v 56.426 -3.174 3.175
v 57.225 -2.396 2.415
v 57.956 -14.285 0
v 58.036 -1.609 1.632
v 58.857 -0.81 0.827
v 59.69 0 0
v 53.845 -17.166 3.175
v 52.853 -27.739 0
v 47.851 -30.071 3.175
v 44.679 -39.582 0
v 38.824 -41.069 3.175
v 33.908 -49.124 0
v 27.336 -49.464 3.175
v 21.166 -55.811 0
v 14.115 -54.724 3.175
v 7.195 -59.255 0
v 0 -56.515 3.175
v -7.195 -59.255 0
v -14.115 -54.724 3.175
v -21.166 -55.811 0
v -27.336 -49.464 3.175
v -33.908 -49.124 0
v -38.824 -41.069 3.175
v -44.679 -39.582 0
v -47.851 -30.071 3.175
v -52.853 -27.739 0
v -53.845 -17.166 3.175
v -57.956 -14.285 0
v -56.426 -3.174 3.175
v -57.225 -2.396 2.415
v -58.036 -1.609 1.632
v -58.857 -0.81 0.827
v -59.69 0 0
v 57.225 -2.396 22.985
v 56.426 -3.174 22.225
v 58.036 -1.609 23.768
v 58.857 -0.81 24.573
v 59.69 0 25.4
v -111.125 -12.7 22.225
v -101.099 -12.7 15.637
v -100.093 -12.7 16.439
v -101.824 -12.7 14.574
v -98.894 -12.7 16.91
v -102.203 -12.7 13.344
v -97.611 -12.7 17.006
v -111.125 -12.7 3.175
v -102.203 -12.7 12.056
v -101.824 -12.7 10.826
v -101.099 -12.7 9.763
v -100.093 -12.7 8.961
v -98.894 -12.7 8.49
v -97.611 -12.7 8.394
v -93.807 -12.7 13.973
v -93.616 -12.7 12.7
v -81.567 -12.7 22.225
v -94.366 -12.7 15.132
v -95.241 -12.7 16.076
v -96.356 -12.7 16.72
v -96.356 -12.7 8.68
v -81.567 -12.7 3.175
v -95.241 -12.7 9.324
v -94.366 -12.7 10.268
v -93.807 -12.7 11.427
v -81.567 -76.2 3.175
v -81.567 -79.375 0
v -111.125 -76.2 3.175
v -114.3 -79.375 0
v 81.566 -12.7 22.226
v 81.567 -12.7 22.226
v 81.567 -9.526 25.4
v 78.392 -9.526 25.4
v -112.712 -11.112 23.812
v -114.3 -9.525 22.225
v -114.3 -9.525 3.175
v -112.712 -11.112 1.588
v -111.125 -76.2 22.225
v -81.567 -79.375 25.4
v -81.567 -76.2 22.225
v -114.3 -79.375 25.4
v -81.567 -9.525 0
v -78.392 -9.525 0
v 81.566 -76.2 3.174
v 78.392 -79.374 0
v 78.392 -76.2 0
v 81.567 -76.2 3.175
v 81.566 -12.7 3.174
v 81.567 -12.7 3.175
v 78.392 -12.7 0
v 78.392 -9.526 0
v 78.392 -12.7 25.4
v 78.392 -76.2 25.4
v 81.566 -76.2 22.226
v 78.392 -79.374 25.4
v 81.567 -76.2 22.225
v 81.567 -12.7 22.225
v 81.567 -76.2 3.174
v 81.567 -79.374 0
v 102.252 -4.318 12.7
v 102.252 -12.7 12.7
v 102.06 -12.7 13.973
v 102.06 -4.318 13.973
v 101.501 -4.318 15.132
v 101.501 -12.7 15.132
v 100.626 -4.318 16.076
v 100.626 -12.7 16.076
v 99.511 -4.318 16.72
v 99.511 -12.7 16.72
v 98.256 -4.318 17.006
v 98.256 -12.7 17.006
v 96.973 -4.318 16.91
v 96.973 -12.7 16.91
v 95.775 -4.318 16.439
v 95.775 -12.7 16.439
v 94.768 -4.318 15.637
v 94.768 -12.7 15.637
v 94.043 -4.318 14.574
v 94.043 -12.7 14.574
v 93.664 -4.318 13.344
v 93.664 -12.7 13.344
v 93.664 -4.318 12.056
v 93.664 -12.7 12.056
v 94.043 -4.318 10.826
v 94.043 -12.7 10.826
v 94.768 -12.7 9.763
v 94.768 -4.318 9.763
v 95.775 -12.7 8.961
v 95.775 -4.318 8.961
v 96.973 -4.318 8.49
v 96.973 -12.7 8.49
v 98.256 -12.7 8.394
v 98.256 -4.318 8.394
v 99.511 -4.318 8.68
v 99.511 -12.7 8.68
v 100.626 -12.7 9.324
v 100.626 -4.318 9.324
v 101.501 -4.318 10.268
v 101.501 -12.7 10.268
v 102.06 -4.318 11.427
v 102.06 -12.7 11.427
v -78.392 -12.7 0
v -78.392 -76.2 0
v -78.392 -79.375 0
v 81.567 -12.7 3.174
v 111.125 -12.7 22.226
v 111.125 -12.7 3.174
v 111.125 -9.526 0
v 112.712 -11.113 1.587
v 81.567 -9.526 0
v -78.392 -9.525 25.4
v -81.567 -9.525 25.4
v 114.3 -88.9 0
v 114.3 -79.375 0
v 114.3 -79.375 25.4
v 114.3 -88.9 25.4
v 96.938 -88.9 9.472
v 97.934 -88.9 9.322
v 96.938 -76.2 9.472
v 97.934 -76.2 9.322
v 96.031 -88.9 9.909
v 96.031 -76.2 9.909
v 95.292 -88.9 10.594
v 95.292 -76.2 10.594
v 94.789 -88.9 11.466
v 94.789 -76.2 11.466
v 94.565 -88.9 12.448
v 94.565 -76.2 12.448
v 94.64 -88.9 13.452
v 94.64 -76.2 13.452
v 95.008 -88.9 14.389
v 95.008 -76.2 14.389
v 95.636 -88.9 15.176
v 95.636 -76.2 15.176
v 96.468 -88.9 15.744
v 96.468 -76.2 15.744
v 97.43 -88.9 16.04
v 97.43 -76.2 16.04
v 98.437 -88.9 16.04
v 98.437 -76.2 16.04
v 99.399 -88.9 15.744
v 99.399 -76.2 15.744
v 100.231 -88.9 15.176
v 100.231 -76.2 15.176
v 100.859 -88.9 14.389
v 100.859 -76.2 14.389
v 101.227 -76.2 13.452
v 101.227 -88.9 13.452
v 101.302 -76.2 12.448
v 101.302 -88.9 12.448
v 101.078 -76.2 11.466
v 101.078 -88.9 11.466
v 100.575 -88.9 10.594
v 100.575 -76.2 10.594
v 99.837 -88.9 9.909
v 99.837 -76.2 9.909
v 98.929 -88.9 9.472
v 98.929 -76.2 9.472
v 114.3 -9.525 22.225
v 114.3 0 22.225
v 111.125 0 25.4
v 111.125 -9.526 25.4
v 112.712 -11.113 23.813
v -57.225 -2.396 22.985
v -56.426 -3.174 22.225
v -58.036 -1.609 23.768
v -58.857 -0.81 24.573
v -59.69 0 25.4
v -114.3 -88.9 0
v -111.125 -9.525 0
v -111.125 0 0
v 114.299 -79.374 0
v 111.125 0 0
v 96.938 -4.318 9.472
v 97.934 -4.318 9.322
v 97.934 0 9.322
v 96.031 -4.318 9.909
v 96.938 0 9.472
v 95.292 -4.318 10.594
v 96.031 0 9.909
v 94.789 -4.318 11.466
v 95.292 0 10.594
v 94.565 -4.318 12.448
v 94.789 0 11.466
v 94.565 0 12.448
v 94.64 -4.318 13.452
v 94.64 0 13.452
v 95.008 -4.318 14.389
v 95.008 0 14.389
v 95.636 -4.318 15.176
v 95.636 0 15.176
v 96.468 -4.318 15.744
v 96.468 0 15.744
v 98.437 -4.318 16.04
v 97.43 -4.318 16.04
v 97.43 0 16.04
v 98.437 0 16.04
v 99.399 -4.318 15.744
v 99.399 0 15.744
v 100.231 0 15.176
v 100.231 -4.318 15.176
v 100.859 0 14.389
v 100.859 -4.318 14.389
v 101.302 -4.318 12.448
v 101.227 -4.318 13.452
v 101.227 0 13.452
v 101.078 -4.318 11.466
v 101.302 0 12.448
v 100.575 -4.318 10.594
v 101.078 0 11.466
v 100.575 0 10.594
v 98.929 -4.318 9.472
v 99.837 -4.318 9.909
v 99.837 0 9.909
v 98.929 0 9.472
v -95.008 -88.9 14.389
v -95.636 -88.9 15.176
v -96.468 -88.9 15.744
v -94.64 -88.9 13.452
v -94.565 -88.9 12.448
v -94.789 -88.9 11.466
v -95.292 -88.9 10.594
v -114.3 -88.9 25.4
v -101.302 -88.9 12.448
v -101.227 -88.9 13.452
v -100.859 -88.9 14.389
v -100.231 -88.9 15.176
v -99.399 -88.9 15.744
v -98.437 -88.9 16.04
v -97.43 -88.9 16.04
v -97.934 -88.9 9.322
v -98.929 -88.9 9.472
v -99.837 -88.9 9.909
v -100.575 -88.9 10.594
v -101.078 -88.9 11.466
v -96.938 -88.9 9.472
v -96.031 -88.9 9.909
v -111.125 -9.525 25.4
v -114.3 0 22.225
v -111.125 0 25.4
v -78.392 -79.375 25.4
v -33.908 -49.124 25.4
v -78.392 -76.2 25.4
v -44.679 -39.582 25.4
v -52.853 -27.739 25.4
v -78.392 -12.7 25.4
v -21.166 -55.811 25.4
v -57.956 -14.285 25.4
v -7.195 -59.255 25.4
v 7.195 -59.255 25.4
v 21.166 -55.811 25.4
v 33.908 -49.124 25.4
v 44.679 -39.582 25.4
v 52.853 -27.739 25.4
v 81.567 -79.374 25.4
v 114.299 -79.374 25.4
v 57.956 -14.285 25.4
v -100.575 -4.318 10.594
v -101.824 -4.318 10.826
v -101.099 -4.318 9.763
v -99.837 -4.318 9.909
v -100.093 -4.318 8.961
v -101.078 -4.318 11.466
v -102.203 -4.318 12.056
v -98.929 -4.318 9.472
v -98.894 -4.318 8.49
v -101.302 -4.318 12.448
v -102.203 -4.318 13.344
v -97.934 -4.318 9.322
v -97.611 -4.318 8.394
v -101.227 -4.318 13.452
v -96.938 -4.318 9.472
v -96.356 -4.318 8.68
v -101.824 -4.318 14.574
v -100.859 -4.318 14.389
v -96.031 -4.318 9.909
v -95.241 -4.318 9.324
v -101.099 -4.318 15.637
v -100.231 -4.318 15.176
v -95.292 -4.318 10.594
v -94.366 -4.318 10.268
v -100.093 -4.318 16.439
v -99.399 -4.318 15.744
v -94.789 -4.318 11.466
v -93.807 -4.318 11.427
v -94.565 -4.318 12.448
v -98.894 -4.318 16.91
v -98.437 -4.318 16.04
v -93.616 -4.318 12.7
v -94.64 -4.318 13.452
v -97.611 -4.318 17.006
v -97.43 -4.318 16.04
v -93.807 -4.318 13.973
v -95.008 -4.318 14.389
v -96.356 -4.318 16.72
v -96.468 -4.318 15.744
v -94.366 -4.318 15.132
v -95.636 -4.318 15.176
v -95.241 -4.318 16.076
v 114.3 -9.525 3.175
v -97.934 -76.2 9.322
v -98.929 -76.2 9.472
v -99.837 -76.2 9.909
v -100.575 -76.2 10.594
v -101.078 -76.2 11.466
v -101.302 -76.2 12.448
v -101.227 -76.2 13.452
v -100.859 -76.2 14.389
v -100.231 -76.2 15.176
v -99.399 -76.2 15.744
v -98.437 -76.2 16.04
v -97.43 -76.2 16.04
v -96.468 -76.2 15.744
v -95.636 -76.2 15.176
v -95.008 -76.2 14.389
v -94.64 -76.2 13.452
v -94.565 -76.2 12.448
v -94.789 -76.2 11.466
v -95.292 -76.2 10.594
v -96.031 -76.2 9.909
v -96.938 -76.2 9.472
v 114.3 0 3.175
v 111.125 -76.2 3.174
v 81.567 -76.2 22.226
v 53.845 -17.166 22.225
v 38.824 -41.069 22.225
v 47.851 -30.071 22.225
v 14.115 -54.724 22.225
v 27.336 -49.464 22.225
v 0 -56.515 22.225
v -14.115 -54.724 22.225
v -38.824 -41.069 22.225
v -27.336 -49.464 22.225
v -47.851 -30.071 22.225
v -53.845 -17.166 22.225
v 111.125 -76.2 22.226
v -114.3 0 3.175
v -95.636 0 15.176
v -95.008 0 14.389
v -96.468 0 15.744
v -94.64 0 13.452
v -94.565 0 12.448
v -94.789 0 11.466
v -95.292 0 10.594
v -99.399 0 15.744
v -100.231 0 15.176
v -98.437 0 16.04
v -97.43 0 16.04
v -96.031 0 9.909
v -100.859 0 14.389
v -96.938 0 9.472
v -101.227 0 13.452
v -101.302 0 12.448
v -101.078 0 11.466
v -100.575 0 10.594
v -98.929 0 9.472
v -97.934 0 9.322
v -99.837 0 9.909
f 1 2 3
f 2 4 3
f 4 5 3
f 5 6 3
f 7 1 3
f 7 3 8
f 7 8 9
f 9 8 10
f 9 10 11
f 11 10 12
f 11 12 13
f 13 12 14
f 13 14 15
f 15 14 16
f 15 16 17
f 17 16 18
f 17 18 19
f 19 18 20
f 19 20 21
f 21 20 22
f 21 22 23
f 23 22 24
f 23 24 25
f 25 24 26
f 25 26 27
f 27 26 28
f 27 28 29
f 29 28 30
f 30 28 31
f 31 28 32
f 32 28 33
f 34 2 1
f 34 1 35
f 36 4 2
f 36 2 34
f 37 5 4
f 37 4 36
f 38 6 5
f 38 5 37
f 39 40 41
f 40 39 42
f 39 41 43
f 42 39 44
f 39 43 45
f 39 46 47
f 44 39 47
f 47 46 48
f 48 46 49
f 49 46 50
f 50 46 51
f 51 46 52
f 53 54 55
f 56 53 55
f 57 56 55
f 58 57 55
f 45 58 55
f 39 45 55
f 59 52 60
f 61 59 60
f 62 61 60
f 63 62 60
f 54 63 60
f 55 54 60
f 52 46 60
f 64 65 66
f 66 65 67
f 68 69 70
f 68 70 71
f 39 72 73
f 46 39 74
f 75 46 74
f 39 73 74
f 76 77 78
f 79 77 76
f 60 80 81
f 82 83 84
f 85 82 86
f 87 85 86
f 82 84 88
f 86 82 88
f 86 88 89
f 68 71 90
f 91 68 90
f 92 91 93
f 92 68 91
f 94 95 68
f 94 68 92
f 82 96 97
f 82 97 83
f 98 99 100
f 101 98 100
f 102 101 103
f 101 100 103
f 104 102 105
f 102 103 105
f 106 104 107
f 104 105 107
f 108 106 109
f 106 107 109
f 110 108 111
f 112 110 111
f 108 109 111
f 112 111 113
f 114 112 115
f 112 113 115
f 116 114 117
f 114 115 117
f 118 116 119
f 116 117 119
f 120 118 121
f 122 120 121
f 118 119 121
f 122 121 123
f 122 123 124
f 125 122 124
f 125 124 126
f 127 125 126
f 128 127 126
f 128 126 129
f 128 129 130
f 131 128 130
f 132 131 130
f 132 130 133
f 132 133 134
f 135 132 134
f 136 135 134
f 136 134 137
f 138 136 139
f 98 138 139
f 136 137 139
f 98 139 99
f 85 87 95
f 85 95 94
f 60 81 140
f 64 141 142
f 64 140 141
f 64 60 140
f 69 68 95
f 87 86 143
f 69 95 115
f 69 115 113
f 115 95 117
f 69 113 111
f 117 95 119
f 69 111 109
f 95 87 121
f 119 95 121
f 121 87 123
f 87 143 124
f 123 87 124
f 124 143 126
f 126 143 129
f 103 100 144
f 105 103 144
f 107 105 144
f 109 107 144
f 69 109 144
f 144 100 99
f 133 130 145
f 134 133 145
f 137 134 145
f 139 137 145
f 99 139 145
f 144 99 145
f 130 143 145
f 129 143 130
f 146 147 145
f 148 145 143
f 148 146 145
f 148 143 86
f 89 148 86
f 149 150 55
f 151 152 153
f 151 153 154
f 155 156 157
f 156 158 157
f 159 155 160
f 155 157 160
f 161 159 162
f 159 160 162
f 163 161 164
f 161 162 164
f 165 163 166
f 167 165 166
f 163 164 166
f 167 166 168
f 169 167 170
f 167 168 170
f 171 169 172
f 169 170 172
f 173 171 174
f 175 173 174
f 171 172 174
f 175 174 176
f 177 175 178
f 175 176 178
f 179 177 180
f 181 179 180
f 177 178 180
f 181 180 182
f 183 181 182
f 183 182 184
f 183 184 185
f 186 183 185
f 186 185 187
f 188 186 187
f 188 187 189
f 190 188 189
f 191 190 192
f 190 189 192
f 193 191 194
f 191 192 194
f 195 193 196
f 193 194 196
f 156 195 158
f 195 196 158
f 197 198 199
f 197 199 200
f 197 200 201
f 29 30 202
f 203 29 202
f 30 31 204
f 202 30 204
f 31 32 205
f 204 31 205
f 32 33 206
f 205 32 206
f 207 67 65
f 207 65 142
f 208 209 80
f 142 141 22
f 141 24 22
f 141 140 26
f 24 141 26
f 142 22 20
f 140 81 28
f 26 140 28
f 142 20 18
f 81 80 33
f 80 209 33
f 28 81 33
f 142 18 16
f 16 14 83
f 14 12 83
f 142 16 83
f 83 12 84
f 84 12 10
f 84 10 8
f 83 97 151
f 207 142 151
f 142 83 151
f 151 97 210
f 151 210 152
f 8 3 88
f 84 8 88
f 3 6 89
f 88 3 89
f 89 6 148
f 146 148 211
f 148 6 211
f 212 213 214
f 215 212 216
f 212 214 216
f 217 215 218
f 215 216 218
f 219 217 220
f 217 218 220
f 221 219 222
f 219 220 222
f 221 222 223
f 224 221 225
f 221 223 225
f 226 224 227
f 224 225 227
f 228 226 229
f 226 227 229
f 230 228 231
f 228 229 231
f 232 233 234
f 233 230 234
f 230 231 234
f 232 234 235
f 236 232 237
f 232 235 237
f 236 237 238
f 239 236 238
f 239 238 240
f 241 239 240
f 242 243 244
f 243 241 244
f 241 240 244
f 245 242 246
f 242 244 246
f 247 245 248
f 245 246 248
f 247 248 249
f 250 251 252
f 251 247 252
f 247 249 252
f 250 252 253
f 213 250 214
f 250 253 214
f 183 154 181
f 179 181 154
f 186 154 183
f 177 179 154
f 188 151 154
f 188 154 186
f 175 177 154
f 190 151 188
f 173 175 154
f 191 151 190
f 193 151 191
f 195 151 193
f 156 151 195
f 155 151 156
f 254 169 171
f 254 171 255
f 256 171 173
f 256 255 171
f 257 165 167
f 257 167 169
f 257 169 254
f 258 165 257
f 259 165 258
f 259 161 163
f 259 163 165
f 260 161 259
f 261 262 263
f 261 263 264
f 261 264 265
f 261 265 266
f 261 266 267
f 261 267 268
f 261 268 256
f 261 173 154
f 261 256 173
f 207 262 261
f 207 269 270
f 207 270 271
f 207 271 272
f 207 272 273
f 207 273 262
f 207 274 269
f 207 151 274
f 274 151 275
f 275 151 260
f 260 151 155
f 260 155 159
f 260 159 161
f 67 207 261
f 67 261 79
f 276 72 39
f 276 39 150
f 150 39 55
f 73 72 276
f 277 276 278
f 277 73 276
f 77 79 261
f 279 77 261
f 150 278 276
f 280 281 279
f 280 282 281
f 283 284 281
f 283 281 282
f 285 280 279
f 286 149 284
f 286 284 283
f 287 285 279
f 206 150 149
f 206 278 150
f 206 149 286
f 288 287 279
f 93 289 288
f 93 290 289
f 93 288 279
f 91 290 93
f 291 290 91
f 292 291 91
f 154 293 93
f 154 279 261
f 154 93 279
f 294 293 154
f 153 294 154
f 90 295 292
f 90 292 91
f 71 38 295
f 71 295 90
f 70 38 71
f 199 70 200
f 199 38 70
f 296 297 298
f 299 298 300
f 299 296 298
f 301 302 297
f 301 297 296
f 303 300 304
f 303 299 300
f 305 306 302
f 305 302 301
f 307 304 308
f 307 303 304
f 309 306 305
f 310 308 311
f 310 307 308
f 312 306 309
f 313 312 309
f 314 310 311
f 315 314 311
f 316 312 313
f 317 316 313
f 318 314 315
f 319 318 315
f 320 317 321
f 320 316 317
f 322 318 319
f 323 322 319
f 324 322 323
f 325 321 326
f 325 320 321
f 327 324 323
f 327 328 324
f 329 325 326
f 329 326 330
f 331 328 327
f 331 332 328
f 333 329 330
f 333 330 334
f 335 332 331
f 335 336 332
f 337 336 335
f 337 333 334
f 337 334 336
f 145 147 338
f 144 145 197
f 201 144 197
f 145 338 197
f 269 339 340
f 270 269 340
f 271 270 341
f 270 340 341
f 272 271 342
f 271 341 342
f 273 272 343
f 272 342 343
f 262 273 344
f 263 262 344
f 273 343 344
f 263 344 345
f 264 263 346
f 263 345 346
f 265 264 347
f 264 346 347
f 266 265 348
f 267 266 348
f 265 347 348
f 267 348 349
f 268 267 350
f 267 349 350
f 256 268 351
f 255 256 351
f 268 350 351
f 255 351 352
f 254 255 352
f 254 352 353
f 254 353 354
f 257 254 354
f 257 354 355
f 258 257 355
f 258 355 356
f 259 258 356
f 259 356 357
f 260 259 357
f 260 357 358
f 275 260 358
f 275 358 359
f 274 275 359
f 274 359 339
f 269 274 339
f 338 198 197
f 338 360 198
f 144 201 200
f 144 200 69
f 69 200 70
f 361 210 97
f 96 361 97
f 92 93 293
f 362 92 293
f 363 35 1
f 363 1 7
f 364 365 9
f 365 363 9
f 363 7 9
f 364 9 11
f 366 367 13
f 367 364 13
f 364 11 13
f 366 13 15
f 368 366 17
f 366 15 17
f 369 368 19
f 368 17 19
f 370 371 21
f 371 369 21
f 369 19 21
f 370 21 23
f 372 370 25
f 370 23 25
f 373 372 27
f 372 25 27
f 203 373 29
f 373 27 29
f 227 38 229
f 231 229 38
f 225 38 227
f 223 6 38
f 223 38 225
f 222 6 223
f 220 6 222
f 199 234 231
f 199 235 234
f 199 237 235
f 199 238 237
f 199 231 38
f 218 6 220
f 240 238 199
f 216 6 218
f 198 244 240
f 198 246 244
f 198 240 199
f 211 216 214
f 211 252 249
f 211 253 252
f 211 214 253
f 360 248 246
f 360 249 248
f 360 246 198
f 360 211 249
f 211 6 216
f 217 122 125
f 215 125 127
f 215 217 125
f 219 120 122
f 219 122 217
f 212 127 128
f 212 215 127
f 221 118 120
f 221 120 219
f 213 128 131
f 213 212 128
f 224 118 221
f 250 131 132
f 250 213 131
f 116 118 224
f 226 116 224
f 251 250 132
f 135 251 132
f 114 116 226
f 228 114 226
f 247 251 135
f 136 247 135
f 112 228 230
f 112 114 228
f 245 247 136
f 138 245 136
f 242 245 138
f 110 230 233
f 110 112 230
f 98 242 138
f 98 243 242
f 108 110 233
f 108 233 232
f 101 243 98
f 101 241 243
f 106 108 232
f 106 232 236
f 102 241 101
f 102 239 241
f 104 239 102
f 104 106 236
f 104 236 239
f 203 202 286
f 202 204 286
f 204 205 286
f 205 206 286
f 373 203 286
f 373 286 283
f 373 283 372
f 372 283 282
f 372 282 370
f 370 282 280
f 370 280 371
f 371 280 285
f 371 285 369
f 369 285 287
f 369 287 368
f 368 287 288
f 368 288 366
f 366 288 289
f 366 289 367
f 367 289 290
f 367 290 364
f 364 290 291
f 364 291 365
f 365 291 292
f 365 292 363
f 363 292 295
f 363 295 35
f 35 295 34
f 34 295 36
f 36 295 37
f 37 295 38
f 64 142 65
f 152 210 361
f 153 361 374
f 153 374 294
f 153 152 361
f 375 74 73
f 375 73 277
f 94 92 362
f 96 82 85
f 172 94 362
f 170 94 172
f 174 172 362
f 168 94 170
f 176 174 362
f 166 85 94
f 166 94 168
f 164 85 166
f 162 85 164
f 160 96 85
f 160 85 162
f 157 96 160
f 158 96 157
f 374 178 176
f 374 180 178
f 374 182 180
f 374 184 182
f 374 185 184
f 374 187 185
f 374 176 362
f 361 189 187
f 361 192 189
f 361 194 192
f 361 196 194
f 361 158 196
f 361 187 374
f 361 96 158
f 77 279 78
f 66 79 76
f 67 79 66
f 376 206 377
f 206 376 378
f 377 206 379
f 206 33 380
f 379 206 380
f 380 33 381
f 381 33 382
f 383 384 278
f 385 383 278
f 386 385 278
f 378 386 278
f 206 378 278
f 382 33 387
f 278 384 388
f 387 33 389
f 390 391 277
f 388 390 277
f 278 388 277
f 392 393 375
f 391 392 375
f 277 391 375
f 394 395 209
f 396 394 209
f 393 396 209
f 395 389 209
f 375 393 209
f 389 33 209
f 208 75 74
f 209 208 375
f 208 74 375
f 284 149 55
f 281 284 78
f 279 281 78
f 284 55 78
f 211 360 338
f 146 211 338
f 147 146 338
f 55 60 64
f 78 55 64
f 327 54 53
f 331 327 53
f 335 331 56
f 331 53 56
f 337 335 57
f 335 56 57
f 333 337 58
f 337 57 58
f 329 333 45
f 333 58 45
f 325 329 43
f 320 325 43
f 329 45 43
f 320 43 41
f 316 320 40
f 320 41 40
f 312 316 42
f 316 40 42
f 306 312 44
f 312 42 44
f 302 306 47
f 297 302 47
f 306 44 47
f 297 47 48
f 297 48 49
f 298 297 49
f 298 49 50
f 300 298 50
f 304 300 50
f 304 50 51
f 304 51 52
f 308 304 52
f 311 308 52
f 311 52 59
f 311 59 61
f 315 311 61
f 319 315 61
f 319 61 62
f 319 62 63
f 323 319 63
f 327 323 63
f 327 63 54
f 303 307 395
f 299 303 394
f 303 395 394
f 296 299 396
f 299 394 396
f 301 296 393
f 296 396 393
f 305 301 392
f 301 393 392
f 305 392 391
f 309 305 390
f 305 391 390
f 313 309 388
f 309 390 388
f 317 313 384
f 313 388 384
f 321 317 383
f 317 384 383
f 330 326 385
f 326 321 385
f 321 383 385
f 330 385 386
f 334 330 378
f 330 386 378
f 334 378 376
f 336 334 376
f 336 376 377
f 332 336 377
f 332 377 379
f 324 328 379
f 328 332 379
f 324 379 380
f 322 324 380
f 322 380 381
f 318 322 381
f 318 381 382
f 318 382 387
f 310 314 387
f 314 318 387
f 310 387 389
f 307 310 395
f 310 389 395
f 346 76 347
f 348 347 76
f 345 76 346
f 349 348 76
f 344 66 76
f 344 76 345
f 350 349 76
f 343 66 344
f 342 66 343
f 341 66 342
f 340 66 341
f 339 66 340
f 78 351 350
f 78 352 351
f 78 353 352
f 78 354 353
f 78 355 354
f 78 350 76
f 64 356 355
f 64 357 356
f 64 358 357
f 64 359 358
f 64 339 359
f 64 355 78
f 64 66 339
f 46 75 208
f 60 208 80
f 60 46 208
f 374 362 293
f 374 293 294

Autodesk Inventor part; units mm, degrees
ref_plane "YZ Plane" through (0, 0, 0) normal (1, 0, 0) x (0, 1, 0)
ref_plane "XZ Plane" through (0, 0, 0) normal (0, 1, 0) x (-1, 0, 0)
ref_plane "XY Plane" through (0, 0, 0) normal (0, 0, 1) x (1, 0, 0)
sketch "Sketch1" plane through (0, 0, 0) normal (0, 0, 1) x (1, 0, 0)
  arc A0 (-56.515, 0) -> (56.515, 0) centre (0, 0) ccw
  line L0 (114.3, -88.9) -> (-114.3, -88.9)
  line L1 (-114.3, 88.9) -> (114.3, 88.9) construction
  line L2 (-56.515, 0) -> (-114.3, 0)
  line L3 (-114.3, -76.2) -> (-81.5672, -76.2)
  line L4 (81.5672, -76.2) -> (114.3, -76.2)
  line L5 (114.3, 0) -> (114.3, -12.7)
  line L6 (114.3, -76.2) -> (114.3, -88.9)
  line L7 (-114.3, -88.9) -> (-114.3, -76.2)
  line L8 (-114.3, -12.7) -> (-114.3, 0)
  line L9 (-114.3, 0) -> (-56.515, 0)
  line L10 (56.515, 0) -> (114.3, 0)
  line L11 (-114.3, -12.7) -> (-81.5672, -12.7)
  line L12 (81.5672, -12.7) -> (114.3, -12.7)
  line L13 (-81.5672, -12.7) -> (-81.5672, -76.2)
  line L14 (81.5672, -12.7) -> (81.5672, -76.2)
  dimension "d0" = 113.03
  dimension "d7" = 57.785
extrude "Extrusion1" add sketch "Sketch1" along normal blind 25.4
sketch "Sketch2" plane through (81.5672, -12.7, 0) normal (0, -1, 0) x (1, 0, 0)
  line L0 (32.7328, 0) -> (0, 25.4) construction
  line L1 (-195.8672, 0) -> (-195.8672, 25.4) projected
  line L2 (-195.8672, 25.4) -> (-163.1345, 0) construction
  point P0 (-81.5672, 0)
  point P1 (-179.5008, 12.7)
  point P2 (16.3664, 12.7)
hole "Hole1" at (-97.9336, -12.7, 12.7) at (97.9336, -12.7, 12.7) direction (0, -1, 0) diameter 6.604 end through all clearance for "Flat Head Machine Screw" size "M6" standard "Ansi Metric M Profile"
sketch "Sketch3" plane through (-114.3, -88.9, 0) normal (0, -1, 0) x (1, 0, 0)
  circle A0 centre (212.2336, 12.7) radius 3.302 projected
  circle A1 centre (16.3664, 12.7) radius 3.302 projected
  point P0 (114.3, 0)
hole "Hole2" at (97.9336, -88.9, 12.7) at (-97.9336, -88.9, 12.7) direction (0, 1, 0) diameter 6.7564 end through all clearance for "Flat Head Machine Screw (82)" size "1/4" standard "Ansi Unified Screw Threads"
sketch "Sketch4" plane through (-114.3, -12.7, 0) normal (0, -1, 0) x (1, 0, 0)
  circle A0 centre (16.3664, 12.7) radius 3.3782 projected
  circle A1 centre (16.3664, 12.7) radius 4.318
  circle A2 centre (212.2336, 12.7) radius 3.3782 projected
  circle A3 centre (212.2336, 12.7) radius 4.318
  point P0 (114.3, 0)
  dimension "d26" = 8.636
  dimension "d27" = 8.636
extrude "Extrusion2" cut sketch "Sketch4" against normal blind 8.382
chamfer "Chamfer1" distance 3.175 angle 45 6 edges at (-56.515, 0, 12.7) (56.515, 0, 12.7) (-114.3, -6.35, 25.4) (-114.3, -6.35, 0) (114.3, -6.35, 25.4) (114.3, -6.35, 0)
chamfer "Chamfer2" distance 3.175 angle 45 18 edges at (0, -56.515, 25.4) (0, -56.515, 0) (-81.5672, -44.45, 25.4) (-96.3461, -12.7, 25.4) (-81.5672, -44.45, 0) (-96.3461, -12.7, 0) (-114.3, -12.7, 12.7) (-97.9336, -76.2, 25.4) (-97.9336, -76.2, 0) (-114.3, -76.2, 12.7) (81.5672, -44.45, 25.4) (81.5672, -44.45, 0) (96.3461, -12.7, 25.4) (114.3, -12.7, 12.7) (96.3461, -12.7, 0) (97.9336, -76.2, 25.4) (114.3, -76.2, 12.7) (97.9336, -76.2, 0)
properties part number "2121_Copper Tube Clamp Bottom_V1" material "ABS Plastic"
